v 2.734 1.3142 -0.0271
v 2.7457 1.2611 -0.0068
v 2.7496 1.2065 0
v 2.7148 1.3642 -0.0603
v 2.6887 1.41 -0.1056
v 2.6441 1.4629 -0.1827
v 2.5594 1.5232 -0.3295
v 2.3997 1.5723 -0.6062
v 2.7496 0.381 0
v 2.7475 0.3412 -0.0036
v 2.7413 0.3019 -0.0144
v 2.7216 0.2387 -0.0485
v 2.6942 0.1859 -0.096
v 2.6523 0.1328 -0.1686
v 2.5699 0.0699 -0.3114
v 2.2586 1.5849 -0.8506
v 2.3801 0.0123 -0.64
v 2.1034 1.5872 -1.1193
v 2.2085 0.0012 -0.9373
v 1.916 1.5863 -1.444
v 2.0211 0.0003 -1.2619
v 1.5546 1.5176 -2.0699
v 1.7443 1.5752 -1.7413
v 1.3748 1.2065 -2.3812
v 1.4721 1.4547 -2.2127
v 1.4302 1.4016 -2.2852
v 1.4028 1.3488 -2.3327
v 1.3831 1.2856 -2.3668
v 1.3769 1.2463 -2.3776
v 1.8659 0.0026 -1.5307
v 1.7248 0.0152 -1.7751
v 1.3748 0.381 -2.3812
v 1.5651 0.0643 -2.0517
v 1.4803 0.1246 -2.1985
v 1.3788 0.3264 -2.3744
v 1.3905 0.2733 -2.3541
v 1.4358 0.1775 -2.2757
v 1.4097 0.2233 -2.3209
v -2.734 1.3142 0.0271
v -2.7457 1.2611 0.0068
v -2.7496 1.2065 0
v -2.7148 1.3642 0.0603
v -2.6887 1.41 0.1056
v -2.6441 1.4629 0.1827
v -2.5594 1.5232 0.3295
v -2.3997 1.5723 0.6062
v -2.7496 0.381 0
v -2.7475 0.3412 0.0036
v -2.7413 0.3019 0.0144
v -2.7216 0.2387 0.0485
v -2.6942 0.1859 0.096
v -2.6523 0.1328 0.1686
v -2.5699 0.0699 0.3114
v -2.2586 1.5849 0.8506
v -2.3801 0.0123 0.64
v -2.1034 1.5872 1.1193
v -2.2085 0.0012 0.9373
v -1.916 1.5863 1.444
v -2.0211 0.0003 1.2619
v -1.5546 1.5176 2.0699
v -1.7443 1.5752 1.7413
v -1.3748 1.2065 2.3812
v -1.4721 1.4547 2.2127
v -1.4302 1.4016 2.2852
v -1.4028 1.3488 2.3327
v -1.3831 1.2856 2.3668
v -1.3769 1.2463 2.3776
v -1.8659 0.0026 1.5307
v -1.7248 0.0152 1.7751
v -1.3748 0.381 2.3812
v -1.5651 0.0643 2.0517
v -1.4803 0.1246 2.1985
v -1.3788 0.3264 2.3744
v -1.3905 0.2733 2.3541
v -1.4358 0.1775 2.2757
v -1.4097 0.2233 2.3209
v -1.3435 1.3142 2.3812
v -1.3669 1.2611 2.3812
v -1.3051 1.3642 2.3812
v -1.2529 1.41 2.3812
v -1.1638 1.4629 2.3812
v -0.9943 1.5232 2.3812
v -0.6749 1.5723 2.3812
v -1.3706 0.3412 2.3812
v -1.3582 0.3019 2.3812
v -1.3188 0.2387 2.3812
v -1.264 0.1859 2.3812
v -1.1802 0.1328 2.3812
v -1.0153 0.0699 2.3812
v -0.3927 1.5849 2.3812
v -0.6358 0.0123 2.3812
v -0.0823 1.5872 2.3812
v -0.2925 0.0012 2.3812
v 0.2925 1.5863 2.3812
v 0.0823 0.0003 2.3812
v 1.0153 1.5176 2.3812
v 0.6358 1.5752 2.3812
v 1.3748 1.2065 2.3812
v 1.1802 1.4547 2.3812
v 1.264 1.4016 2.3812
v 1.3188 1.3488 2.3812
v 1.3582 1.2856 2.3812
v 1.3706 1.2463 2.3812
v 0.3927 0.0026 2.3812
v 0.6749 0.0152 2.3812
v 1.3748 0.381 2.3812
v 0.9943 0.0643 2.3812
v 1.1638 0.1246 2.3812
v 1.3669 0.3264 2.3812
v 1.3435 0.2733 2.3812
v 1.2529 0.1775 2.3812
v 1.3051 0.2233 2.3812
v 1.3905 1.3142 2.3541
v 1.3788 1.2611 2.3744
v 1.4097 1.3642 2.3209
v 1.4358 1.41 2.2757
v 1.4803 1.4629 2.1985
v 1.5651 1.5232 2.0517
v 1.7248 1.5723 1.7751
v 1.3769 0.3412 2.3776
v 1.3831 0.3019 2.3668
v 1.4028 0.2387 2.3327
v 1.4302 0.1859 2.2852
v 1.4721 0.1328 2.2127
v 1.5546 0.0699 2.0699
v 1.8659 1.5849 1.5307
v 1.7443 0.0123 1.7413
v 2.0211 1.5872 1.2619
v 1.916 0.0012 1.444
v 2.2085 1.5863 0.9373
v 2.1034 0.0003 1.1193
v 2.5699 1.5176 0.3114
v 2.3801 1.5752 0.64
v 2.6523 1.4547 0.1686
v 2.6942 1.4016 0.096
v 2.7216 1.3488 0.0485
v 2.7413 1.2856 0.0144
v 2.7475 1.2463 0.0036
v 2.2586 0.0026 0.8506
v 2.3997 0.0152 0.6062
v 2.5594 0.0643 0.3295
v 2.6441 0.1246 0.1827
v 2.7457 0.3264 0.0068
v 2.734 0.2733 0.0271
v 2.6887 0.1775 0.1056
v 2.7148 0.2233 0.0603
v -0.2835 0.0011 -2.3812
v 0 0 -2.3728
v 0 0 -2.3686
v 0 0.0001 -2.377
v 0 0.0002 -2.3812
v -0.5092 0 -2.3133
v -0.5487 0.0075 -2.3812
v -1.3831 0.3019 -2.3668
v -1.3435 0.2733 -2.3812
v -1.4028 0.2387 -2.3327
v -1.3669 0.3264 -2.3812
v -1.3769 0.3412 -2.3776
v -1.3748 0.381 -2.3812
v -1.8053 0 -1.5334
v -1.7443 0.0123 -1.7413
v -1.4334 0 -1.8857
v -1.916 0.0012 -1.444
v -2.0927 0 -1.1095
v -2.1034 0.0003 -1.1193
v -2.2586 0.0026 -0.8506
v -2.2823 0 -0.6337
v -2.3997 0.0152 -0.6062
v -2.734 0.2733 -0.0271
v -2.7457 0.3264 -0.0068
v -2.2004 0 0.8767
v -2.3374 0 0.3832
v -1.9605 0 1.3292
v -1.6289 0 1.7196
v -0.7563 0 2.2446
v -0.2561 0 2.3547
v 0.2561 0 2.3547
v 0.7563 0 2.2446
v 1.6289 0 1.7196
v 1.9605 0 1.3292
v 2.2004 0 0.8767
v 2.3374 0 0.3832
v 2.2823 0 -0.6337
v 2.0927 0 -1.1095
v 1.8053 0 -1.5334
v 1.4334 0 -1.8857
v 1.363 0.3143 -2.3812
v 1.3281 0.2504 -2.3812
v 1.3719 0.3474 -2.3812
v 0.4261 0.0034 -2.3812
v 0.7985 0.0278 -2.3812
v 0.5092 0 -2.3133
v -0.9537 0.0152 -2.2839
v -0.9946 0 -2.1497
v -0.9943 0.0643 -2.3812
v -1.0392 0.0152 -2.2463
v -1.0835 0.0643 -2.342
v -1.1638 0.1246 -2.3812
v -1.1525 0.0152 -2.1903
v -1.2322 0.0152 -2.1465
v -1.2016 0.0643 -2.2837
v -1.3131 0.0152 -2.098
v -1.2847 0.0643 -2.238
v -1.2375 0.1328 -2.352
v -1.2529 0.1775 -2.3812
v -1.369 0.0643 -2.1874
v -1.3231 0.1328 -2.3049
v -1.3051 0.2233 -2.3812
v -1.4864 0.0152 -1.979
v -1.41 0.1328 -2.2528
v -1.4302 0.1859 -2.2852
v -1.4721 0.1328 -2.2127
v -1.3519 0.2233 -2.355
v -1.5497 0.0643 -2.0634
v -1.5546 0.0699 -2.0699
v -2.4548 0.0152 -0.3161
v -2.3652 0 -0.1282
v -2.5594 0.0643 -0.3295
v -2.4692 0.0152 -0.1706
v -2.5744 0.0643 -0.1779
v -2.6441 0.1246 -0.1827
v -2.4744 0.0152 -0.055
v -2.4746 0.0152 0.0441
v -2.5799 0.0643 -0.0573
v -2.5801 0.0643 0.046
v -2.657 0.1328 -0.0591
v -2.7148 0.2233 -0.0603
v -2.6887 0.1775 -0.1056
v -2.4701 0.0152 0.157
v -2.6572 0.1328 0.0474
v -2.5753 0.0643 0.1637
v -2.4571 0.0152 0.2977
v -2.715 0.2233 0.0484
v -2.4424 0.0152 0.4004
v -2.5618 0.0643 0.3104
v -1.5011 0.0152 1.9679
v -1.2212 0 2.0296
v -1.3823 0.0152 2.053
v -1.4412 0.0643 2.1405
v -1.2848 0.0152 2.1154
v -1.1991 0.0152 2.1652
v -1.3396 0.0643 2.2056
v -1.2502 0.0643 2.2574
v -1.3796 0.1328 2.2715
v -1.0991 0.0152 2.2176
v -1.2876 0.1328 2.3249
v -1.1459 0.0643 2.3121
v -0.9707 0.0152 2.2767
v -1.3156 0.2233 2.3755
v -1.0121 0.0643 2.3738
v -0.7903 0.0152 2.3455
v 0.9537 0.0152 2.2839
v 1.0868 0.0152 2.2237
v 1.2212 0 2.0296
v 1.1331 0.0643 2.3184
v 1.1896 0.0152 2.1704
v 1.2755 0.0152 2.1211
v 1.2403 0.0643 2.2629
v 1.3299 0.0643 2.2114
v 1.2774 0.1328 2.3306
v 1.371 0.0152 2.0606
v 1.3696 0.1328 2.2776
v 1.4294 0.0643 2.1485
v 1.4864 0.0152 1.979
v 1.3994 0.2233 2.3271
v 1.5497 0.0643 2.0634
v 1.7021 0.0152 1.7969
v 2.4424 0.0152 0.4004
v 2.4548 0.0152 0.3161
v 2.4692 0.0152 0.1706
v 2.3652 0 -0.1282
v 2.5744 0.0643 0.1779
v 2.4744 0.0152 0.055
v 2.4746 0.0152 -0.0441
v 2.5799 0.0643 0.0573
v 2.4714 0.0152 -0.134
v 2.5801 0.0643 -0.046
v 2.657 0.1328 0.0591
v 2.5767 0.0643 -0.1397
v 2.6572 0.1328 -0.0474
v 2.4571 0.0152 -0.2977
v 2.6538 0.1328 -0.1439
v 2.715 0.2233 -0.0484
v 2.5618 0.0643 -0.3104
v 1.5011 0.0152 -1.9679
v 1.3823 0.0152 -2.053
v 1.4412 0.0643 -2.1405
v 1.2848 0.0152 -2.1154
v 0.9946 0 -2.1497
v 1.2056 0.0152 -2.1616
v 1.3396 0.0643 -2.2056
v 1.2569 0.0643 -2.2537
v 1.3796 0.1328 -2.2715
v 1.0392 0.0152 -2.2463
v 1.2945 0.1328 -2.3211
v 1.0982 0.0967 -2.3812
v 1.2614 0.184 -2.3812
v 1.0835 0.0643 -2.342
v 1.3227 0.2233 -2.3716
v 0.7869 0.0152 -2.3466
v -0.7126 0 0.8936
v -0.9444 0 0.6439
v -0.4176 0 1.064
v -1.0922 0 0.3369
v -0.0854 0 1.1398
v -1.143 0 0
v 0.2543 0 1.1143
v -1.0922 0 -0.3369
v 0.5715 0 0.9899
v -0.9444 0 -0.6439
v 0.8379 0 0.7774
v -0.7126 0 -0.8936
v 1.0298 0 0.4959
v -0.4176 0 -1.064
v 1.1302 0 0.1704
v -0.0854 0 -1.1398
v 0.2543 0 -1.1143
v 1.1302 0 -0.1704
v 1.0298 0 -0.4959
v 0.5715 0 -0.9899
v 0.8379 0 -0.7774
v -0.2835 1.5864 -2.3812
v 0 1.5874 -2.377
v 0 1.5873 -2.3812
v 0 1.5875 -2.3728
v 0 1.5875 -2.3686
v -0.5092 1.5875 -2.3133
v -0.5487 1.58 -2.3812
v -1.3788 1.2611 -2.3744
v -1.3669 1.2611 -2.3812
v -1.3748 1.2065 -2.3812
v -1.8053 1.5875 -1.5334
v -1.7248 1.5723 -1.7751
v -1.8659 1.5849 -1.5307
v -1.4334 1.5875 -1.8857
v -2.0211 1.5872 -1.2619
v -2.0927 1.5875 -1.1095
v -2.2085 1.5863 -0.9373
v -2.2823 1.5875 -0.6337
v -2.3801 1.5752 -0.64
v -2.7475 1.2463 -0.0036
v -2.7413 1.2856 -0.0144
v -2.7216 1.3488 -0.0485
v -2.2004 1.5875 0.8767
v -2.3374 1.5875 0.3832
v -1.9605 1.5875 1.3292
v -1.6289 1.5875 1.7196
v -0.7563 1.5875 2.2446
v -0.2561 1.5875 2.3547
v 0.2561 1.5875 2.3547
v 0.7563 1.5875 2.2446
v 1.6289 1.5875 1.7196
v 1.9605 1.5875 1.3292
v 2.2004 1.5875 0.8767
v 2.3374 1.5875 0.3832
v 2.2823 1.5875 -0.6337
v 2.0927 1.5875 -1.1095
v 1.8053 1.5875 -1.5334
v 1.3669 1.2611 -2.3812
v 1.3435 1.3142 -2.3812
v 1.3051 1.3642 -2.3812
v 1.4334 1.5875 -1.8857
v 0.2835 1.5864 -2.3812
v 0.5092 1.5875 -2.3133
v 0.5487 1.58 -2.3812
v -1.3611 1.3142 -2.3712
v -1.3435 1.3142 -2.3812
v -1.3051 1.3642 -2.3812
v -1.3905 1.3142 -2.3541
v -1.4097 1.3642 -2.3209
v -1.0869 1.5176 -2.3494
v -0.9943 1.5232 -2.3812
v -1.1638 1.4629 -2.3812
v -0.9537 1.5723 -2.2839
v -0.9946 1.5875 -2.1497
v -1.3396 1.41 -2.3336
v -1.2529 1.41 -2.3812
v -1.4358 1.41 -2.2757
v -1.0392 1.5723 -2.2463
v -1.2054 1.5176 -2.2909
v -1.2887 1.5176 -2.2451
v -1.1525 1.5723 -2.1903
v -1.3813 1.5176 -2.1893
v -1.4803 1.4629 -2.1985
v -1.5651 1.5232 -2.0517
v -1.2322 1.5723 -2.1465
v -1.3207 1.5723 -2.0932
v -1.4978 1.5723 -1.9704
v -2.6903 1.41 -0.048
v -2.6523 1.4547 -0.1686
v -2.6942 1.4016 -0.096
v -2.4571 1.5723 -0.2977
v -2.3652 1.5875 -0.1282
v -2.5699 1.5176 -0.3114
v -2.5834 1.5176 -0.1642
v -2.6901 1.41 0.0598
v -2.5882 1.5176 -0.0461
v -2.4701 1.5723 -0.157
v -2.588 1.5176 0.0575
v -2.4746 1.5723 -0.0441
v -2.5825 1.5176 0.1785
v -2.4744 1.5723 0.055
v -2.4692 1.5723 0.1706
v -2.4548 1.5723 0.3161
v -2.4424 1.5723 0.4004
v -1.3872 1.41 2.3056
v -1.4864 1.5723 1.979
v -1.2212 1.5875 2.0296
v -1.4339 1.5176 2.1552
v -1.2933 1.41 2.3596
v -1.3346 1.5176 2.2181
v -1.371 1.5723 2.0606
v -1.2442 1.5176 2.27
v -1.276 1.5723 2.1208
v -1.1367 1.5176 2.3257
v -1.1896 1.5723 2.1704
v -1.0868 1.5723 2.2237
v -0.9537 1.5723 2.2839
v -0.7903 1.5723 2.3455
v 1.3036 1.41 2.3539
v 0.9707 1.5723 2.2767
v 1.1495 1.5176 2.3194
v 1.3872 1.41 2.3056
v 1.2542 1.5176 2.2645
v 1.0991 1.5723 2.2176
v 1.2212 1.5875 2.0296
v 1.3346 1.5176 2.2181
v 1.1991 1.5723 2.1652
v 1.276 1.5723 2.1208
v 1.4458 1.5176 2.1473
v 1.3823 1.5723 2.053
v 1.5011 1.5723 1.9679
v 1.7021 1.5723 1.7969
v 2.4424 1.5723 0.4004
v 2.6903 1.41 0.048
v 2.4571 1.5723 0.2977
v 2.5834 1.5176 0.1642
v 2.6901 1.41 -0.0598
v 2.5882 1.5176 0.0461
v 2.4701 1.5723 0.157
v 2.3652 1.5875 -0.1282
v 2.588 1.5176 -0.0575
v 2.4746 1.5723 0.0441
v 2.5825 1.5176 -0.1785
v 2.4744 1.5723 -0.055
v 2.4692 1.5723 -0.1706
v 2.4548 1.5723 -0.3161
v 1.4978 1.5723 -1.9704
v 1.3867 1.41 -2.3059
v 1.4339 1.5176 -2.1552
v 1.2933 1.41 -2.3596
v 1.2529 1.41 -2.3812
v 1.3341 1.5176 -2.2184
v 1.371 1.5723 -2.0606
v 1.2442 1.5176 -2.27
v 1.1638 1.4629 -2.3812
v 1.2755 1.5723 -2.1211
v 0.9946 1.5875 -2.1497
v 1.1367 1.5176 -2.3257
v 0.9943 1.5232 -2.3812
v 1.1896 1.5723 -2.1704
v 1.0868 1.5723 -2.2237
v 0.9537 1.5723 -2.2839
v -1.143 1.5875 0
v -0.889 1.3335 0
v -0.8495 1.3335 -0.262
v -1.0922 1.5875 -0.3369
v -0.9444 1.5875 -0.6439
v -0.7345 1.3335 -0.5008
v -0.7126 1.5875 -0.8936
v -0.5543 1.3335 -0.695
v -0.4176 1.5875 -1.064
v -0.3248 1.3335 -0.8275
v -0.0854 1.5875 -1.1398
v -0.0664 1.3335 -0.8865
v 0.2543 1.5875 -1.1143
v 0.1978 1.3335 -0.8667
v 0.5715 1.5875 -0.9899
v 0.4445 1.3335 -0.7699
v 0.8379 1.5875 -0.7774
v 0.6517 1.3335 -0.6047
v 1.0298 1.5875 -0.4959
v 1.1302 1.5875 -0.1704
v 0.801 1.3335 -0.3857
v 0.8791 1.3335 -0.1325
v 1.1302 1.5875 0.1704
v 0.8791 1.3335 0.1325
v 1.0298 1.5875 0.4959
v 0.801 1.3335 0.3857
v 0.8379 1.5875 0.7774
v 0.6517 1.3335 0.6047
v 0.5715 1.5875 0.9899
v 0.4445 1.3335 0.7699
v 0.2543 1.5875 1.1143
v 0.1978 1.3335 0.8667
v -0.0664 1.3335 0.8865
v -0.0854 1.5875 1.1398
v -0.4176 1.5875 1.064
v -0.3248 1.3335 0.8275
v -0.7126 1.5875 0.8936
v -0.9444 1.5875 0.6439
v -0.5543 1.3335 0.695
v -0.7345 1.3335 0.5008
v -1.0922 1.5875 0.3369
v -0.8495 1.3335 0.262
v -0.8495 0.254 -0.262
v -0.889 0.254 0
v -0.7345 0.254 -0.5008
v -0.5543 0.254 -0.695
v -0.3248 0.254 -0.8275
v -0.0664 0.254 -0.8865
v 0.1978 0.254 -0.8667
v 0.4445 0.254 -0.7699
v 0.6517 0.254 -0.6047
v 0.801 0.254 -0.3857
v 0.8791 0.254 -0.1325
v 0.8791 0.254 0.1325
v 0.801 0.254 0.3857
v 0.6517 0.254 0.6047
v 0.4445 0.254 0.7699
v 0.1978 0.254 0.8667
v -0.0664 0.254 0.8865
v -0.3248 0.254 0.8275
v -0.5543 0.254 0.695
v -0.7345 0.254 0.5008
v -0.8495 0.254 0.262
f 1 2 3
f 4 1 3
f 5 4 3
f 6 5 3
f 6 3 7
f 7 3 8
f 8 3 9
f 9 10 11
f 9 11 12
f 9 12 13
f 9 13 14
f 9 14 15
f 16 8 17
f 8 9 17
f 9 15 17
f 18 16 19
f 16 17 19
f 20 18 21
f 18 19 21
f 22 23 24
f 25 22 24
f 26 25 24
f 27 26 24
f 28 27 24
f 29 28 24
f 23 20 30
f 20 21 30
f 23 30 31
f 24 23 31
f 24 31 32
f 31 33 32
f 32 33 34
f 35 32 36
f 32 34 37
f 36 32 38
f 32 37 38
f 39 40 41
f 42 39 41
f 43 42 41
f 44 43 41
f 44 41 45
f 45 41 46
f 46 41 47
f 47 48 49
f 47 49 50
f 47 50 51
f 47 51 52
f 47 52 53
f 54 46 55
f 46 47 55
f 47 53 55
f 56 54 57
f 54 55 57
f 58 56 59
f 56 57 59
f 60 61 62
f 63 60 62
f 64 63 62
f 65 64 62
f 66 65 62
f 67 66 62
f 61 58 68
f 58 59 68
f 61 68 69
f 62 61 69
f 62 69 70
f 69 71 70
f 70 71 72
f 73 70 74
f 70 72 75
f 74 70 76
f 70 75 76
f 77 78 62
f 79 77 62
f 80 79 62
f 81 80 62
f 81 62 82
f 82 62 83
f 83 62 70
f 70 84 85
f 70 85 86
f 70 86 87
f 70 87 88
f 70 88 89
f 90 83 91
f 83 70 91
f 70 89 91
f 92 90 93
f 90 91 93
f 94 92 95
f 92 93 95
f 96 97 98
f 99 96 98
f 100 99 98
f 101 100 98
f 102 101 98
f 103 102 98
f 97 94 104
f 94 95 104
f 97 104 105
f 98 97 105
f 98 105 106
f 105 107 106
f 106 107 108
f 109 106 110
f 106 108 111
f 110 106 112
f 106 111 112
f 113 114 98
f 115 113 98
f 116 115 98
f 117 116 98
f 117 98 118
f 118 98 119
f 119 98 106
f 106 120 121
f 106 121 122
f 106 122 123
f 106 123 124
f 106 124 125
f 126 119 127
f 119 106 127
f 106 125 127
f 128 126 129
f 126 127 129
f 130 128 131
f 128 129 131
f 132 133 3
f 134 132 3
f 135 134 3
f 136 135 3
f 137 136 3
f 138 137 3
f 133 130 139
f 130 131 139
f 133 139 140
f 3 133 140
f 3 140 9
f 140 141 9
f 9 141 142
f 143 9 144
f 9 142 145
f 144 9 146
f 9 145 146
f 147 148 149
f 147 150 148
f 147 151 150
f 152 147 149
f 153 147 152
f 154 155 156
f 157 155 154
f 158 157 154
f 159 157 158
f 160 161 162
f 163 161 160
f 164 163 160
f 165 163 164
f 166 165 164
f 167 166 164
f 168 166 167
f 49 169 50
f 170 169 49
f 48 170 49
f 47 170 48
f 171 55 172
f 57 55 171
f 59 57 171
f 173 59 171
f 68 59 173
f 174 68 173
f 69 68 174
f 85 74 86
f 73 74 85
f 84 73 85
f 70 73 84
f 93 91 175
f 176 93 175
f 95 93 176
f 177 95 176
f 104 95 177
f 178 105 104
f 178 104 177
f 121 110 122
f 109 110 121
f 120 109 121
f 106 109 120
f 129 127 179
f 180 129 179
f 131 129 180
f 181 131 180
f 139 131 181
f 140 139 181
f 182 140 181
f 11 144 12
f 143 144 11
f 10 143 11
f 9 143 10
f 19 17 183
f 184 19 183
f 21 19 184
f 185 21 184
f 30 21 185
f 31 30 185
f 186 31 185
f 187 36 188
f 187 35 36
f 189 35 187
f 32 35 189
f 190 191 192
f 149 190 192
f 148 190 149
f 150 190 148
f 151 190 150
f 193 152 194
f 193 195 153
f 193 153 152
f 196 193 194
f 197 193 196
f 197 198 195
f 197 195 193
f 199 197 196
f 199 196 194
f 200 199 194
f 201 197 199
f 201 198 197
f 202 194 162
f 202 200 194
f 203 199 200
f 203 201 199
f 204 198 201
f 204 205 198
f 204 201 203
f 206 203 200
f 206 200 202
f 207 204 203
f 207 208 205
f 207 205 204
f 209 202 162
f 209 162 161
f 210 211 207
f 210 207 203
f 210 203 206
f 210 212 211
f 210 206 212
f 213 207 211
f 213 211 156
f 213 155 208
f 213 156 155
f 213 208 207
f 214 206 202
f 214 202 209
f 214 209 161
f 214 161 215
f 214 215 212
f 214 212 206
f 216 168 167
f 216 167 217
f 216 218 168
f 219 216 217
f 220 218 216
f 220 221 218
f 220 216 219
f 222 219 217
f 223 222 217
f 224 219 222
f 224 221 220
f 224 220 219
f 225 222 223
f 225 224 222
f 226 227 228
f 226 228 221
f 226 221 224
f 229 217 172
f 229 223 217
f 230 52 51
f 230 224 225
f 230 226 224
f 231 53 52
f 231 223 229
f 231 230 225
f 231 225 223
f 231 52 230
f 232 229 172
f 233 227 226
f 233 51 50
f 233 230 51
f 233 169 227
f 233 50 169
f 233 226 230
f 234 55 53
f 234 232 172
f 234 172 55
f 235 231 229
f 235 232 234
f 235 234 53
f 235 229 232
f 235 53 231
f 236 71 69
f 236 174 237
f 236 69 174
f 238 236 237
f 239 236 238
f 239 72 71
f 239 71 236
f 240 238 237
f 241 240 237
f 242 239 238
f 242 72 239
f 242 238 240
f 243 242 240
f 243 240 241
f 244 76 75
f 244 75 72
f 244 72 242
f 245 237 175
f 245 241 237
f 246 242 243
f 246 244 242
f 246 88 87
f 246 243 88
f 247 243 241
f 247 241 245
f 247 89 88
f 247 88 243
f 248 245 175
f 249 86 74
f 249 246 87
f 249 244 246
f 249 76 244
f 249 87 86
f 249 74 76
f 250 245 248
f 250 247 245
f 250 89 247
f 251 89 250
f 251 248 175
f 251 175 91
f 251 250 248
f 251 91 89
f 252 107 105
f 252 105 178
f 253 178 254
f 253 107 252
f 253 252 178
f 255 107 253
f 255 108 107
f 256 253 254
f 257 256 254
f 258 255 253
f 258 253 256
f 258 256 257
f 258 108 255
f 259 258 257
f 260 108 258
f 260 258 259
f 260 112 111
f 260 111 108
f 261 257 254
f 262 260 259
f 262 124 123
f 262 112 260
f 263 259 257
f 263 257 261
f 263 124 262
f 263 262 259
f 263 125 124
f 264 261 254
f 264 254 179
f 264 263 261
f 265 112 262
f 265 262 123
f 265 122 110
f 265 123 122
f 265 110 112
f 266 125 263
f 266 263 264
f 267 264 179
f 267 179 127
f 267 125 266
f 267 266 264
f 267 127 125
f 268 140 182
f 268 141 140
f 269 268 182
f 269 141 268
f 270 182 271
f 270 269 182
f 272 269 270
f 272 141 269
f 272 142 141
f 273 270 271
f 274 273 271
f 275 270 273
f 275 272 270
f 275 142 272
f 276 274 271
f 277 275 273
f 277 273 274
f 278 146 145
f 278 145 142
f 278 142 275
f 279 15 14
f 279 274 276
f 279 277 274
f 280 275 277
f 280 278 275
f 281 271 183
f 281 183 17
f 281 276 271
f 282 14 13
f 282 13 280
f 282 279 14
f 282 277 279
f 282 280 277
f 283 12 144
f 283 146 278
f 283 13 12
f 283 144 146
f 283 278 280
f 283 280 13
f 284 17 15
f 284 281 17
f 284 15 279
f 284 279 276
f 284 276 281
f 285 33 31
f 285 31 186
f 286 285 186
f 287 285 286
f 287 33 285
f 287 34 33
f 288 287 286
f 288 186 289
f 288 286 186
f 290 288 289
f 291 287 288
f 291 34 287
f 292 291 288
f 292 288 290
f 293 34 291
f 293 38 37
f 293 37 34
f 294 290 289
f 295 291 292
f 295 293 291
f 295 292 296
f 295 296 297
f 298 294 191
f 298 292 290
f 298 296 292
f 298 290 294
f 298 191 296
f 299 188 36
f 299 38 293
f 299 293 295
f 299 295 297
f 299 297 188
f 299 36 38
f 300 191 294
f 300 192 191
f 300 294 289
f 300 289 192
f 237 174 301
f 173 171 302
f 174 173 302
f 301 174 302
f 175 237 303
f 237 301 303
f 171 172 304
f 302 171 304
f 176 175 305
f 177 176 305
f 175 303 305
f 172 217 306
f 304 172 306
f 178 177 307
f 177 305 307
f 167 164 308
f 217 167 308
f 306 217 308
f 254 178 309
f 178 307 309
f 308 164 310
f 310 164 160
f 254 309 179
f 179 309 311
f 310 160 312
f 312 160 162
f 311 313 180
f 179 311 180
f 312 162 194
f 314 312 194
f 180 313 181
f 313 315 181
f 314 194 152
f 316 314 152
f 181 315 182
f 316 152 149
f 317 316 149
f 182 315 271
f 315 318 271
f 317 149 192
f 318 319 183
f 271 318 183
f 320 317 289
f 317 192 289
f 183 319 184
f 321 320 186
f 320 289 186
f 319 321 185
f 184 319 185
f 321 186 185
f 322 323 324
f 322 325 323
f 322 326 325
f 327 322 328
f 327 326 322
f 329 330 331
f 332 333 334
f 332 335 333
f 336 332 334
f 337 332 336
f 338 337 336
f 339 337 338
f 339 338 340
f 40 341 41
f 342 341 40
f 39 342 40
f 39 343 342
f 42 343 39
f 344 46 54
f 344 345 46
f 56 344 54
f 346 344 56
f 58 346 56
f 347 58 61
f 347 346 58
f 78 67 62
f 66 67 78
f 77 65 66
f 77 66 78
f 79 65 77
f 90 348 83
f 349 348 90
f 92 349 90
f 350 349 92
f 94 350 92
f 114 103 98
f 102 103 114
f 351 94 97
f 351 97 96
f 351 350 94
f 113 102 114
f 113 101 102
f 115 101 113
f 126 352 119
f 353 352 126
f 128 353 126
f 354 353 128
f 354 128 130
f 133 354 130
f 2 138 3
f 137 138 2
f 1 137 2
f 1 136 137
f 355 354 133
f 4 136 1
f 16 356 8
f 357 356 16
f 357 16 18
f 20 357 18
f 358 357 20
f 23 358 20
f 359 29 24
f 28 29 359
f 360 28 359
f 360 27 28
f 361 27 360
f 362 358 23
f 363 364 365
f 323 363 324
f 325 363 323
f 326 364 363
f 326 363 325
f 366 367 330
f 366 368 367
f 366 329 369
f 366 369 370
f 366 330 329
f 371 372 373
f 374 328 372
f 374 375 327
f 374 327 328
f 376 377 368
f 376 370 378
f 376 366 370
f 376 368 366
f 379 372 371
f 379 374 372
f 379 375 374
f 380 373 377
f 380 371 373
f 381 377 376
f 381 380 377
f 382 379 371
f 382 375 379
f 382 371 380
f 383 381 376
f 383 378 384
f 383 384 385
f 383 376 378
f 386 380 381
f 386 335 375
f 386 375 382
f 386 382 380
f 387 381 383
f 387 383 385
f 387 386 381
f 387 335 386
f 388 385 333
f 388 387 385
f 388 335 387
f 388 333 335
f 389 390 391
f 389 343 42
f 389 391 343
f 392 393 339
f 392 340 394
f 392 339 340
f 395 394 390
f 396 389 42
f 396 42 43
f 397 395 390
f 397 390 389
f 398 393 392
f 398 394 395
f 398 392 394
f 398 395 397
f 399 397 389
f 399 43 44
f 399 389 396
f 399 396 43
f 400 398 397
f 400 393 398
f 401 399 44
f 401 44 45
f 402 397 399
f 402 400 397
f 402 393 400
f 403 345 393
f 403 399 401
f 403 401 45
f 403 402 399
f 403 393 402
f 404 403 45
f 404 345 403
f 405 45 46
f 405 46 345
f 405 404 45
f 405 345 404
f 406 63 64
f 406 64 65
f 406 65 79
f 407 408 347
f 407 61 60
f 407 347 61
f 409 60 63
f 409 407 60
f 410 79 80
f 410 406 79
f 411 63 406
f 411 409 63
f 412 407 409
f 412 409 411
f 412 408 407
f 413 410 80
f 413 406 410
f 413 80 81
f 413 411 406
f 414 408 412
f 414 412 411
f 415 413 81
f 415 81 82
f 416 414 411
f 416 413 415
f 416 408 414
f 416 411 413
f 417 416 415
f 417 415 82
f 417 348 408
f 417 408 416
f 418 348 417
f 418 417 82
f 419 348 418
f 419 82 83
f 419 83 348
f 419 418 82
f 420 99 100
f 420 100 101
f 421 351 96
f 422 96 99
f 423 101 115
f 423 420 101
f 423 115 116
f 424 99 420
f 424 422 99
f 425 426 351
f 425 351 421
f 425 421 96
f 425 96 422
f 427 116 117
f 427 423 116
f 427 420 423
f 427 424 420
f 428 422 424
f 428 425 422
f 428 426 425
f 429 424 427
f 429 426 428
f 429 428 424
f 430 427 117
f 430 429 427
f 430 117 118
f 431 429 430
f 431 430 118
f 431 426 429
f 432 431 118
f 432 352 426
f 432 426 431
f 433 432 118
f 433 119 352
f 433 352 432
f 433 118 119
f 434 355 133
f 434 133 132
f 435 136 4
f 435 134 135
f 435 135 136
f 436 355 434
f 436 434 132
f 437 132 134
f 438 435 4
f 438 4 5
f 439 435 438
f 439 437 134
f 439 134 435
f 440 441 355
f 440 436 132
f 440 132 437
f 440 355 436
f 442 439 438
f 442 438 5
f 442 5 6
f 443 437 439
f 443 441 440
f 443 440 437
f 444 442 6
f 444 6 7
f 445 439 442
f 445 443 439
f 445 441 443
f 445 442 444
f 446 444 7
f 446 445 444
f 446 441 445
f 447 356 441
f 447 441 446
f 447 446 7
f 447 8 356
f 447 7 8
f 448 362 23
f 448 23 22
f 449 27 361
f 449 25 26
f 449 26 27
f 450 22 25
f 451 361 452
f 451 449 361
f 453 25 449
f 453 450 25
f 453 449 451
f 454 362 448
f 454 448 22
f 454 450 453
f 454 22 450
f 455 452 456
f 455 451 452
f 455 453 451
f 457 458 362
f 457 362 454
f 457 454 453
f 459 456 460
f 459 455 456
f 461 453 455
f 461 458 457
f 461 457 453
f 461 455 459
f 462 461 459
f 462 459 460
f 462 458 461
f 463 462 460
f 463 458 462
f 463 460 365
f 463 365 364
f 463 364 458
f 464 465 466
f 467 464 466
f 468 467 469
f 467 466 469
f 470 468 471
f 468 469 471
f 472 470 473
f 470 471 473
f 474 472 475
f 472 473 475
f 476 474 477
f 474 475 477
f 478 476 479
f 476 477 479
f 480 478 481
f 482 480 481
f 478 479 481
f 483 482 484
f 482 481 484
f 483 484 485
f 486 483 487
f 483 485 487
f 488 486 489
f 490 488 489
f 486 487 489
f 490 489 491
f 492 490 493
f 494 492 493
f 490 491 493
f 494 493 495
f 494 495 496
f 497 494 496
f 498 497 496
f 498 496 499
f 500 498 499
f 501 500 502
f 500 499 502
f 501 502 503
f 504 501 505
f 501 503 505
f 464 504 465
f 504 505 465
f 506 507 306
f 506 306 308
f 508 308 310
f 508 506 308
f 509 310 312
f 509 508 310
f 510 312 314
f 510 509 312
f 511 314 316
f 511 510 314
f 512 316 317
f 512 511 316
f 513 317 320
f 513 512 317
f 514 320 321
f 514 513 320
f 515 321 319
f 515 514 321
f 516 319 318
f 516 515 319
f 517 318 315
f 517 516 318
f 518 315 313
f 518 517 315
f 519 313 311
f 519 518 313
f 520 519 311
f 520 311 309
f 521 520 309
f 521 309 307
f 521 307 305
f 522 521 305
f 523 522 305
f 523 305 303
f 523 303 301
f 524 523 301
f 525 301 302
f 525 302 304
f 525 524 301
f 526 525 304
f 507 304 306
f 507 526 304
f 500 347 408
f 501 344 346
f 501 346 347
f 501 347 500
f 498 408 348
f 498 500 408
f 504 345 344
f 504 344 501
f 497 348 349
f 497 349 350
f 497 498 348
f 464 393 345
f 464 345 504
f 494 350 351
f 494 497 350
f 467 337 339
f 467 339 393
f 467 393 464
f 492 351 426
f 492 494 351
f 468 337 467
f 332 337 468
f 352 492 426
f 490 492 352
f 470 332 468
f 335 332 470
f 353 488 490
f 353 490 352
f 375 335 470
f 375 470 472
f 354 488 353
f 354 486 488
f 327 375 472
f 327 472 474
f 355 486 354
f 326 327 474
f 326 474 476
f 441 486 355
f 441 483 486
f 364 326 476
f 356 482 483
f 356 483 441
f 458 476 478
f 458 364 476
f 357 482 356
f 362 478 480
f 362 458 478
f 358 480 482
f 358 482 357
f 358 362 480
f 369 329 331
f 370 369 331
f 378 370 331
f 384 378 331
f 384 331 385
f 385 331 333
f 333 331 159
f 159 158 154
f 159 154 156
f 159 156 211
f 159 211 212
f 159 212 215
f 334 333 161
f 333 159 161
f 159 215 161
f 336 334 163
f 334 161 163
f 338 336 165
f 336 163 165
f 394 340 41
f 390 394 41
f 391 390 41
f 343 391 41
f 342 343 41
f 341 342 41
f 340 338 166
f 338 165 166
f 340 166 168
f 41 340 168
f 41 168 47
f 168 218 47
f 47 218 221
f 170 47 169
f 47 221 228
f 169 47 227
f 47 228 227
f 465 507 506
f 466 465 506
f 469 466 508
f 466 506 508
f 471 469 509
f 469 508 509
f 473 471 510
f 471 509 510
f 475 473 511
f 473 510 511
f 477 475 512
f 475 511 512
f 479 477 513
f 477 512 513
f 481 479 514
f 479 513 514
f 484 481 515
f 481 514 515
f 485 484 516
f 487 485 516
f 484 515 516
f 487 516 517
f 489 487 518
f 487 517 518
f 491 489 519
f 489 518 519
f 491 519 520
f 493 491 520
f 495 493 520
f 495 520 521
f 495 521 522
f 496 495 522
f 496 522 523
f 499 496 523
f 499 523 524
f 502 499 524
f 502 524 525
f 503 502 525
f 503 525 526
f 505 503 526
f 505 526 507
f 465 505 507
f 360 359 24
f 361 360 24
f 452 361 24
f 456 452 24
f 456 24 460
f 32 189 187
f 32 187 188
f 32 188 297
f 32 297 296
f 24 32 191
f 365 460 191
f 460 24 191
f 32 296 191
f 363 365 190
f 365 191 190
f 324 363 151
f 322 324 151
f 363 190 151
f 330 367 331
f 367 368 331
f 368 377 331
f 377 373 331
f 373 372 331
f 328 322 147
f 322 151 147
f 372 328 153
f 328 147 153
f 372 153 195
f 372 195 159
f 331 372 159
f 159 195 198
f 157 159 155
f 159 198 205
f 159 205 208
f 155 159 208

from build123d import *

# Parameters (mm, degrees)
BOSS_EXTRUDE1_DEPTH   = 1.5875
F_2_56_TAPPED_HOLE1_D = 1.778
CHAMFER2_SIZE         = 0.254


with BuildPart() as part:
    # Sketch1 → Boss-Extrude1 (new body)
    with BuildSketch(Plane(origin=(0, 0, 0), x_dir=(1, 0, 0), z_dir=(0, 1, 0))):
        Polygon((1.374815329, 2.38125), (-1.374815329, 2.38125), (-2.749630657, 0), (-1.374815329, -2.38125), (1.374815329, -2.38125), (2.749630657, 0), align=None)
    extrude(amount=BOSS_EXTRUDE1_DEPTH)

    # #2-56 Tapped Hole1 (through all)
    with Locations(Plane(origin=(0, 1.5875, 0), x_dir=(1, 0, 0), z_dir=(0, 1, 0))):
        with Locations((0, 0)):
            Hole(F_2_56_TAPPED_HOLE1_D / 2)

    # Sketch5 → Cut-Revolve2 (revolve, cut)
    with BuildSketch(Plane.XY, mode=Mode.PRIVATE) as cut_revolve2_sk:
        with BuildLine():
            Line((0, 0), (2.368630657, 0))
            ThreePointArc((2.368630657, 0), (2.638038341, 0.111592316), (2.749630657, 0.381))
            Line((2.749630657, 0.381), (2.749630657, 1.2065))
            ThreePointArc((2.749630657, 1.2065), (2.638038341, 1.475907684), (2.368630657, 1.5875))
            Line((2.368630657, 1.5875), (0, 1.5875))
            Line((0, 1.5875), (0, 2.0955))
            Line((0, 2.0955), (5.08, 2.0955))
            Line((5.08, 2.0955), (5.08, -0.4445))
            Line((5.08, -0.4445), (0, -0.4445))
            Line((0, -0.4445), (0, 0))
        make_face()
    revolve(cut_revolve2_sk.sketch.rotate(Axis((0, 0, 0), (0, 1, 0)), 90), axis=Axis((0, 0, 0), (0, 1, 0)), mode=Mode.SUBTRACT)

    # Chamfer2
    chamfer2_edges = [part.edges().sort_by_distance(p)[0] for p in [
        (0.889, 1.5875, 0),
        (0.889, 0, 0),
    ]]
    chamfer(chamfer2_edges, length=CHAMFER2_SIZE)


solid = part.part
